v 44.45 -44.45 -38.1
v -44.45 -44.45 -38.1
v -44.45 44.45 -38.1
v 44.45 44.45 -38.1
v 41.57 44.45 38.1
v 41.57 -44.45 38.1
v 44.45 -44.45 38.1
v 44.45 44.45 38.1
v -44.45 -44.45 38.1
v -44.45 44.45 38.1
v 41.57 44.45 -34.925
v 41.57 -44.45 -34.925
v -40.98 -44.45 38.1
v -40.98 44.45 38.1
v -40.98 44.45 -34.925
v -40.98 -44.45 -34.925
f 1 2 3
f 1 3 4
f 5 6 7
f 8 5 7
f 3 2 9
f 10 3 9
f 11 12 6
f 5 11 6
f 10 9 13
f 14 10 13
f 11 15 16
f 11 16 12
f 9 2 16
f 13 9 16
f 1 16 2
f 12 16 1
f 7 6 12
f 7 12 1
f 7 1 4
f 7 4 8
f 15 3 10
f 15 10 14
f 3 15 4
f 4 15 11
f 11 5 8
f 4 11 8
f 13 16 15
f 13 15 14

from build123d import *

# Parameters (mm, degrees)
F0_W     = 88.9
F0_H     = 76.2
F1_DEPTH = 44.45
F2_W     = 82.55
F2_H     = 73.025
F3_DEPTH = 44.45


with BuildPart() as f1:
    # F0 (on Front) → F1 (new body, symmetric)
    with BuildSketch(Plane.XZ):
        Rectangle(F0_W, F0_H)
    extrude(amount=F1_DEPTH, both=True)

    # F2 (on Front) → F3 (cut, symmetric)
    with BuildSketch(Plane.XZ):
        with Locations((0.2950895578, 1.5875)):
            Rectangle(F2_W, F2_H)
    extrude(amount=F3_DEPTH, both=True, mode=Mode.SUBTRACT)


solid = f1.part
